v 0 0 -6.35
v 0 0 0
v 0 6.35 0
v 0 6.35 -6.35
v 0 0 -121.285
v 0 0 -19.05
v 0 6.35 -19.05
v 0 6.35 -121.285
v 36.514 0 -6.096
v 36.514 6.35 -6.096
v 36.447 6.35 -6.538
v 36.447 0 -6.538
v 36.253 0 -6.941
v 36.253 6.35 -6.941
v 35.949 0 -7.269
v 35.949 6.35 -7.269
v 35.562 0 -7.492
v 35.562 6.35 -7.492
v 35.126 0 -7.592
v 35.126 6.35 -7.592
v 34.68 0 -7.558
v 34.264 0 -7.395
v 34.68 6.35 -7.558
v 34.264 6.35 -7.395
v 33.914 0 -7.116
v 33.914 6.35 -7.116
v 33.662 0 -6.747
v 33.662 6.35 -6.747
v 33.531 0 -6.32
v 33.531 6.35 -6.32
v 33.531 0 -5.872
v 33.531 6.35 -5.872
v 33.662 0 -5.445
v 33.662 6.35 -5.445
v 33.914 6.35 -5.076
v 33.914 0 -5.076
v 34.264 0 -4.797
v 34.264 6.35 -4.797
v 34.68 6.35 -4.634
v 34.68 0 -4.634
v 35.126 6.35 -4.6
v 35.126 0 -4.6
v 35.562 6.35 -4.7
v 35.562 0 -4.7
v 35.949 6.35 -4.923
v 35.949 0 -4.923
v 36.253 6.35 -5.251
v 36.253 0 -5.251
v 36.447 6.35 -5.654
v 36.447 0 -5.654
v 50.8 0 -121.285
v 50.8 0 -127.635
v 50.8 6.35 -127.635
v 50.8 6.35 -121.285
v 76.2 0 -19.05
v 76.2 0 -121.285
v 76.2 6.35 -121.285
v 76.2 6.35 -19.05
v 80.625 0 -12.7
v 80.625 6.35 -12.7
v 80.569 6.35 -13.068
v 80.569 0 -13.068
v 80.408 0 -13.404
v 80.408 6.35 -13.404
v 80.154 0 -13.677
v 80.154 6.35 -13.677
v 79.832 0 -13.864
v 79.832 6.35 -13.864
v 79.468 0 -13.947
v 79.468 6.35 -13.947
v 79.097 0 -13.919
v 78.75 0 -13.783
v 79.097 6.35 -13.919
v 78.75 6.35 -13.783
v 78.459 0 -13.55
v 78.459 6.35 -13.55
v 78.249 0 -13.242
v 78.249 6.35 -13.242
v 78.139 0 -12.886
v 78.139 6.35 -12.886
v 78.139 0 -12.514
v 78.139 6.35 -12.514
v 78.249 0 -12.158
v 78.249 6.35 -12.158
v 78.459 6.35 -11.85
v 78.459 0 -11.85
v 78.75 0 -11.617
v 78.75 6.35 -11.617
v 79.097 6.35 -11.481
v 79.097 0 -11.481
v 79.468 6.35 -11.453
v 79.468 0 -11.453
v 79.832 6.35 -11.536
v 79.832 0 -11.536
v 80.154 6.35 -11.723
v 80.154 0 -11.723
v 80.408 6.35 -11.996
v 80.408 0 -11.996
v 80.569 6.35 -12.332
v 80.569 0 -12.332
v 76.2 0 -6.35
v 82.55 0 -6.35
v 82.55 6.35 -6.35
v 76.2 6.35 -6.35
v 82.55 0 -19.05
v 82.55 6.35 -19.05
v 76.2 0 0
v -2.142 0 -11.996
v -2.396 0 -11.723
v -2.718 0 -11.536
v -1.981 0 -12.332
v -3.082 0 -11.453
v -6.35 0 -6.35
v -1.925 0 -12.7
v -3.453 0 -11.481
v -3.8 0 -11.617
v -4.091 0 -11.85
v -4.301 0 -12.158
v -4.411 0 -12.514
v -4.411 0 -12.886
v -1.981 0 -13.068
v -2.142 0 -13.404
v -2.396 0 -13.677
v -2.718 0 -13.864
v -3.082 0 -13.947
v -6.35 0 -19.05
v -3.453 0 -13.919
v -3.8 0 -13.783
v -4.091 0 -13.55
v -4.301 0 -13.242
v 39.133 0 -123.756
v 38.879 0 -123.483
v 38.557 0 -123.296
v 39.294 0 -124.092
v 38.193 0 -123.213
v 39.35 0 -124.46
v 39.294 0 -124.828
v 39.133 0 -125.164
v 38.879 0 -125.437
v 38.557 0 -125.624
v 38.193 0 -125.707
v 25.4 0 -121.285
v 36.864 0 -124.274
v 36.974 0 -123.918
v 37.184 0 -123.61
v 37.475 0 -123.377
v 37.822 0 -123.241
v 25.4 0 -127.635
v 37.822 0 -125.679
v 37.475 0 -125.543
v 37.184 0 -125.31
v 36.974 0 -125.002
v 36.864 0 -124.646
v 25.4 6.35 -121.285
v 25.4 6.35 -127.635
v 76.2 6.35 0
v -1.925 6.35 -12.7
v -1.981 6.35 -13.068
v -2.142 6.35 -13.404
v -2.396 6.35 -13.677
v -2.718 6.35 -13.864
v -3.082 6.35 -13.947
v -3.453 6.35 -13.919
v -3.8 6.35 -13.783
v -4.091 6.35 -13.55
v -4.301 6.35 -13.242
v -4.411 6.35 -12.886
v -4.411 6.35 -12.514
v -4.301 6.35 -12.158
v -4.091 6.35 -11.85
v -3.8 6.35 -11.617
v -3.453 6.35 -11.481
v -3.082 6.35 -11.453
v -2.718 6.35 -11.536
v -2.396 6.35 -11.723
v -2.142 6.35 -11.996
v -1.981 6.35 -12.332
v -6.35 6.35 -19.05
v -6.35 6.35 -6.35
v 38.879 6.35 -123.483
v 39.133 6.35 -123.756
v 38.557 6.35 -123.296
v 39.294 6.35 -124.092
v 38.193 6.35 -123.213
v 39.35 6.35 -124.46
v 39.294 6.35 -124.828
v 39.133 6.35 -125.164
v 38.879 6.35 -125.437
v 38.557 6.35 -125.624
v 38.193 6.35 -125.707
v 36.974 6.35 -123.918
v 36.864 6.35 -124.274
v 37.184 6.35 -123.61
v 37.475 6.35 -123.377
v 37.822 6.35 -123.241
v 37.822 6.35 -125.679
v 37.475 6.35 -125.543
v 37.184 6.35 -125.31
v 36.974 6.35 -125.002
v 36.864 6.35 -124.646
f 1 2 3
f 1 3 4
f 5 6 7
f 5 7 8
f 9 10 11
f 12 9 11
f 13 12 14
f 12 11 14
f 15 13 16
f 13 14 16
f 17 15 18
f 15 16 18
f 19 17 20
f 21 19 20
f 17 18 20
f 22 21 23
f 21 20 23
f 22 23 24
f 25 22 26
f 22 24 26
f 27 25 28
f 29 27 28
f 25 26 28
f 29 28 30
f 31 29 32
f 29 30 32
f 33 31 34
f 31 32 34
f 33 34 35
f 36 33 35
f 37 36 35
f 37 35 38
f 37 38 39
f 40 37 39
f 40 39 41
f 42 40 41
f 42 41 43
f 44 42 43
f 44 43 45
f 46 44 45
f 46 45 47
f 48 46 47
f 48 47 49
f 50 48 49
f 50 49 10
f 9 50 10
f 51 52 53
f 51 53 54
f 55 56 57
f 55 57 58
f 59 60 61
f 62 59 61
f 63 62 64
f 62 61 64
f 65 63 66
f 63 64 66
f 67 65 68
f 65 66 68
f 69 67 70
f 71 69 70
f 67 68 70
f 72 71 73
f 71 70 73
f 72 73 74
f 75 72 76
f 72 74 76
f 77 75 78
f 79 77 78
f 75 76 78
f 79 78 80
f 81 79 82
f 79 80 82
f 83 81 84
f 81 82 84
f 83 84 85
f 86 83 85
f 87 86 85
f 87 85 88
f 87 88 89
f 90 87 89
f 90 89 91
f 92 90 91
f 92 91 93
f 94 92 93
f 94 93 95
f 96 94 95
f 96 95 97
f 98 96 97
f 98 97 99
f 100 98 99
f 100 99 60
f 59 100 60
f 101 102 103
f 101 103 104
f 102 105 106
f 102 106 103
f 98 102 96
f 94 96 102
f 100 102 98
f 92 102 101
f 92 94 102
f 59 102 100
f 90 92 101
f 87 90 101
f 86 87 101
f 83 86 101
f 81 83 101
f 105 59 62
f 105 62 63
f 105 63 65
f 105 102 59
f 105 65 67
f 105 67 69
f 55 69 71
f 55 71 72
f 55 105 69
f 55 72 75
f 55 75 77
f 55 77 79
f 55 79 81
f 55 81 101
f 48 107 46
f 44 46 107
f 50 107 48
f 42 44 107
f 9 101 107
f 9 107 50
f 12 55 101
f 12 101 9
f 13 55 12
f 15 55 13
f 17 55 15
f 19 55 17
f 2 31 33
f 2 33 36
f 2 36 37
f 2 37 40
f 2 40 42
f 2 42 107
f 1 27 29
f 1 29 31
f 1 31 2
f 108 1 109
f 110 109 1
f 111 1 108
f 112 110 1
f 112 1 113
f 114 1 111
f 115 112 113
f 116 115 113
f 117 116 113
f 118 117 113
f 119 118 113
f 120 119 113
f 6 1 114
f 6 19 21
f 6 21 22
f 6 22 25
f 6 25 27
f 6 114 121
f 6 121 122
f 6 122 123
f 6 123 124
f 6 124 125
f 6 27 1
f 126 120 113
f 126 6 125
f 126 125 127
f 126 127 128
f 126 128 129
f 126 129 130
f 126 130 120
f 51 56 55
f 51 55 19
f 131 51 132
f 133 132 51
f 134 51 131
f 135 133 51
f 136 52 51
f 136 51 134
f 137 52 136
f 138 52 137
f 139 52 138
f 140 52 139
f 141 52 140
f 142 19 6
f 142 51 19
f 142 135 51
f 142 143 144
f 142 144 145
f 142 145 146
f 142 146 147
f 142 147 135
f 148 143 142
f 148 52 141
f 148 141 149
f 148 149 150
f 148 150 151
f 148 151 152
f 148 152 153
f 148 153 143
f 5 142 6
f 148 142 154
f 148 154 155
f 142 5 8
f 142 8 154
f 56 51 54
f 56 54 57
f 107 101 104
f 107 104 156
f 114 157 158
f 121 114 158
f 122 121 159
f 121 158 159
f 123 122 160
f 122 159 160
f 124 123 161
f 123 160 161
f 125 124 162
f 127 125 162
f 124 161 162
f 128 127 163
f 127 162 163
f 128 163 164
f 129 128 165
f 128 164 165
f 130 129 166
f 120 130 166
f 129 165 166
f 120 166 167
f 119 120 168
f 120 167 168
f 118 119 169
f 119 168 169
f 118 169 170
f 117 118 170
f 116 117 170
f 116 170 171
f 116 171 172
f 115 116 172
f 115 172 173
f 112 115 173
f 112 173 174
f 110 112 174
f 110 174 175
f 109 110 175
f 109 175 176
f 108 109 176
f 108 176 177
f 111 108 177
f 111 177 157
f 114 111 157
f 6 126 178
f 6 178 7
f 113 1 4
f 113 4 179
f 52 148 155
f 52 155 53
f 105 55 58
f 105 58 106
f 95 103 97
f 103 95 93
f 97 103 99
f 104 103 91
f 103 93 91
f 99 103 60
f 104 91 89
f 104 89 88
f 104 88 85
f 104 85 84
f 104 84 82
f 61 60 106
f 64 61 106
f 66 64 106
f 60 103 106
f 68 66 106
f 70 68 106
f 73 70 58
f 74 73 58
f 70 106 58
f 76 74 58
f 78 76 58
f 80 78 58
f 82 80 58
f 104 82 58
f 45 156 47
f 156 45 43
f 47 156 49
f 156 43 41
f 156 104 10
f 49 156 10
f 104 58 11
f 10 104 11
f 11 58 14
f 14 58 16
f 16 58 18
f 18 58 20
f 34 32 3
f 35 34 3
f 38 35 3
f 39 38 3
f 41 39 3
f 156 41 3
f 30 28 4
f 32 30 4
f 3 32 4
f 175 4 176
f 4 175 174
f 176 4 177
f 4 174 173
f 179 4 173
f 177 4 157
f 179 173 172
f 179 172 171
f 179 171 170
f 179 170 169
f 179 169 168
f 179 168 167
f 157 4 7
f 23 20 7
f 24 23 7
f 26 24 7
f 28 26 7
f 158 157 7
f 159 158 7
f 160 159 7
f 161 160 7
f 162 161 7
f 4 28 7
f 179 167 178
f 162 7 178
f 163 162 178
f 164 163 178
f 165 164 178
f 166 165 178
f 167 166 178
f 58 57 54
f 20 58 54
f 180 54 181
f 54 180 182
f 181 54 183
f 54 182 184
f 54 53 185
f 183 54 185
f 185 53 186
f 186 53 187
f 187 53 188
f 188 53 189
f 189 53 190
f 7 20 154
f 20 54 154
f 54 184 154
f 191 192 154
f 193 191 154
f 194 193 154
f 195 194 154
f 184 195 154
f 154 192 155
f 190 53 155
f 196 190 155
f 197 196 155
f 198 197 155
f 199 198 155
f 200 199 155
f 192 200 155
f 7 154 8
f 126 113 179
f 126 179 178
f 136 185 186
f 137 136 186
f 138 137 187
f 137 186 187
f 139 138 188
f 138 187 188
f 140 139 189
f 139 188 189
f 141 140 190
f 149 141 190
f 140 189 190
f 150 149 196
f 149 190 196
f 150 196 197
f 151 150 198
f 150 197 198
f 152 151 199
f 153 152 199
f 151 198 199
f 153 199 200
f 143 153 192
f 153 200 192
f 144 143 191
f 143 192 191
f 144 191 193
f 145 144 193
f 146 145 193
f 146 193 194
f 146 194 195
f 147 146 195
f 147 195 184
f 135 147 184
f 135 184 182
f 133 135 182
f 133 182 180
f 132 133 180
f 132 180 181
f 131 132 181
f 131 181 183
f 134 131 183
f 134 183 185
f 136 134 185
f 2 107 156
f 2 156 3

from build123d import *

# Parameters (mm, degrees)
BOSS_EXTRUDE1_DEPTH = 6.35
SKETCH2_R           = 1.5
CUT_EXTRUDE1_DEPTH  = 7.35
SKETCH3_R           = 1.25
CUT_EXTRUDE2_DEPTH  = 7.35


with BuildPart() as part:
    # Sketch1 → Boss-Extrude1 (new body)
    with BuildSketch(Plane(origin=(0, 0, 0), x_dir=(1, 0, 0), z_dir=(0, 1, 0))):
        Polygon((50.8, 121.285), (76.2, 121.285), (76.2, 19.05), (82.55, 19.05), (82.55, 6.35), (76.2, 6.35), (76.2, 0), (0, 0), (0, 6.35), (-6.35, 6.35), (-6.35, 19.05), (0, 19.05), (0, 121.285), (25.4, 121.285), (25.4, 127.635), (50.8, 127.635), align=None)
    extrude(amount=BOSS_EXTRUDE1_DEPTH)

    # Sketch2 → Cut-Extrude1 (cut, through all)
    with BuildSketch(Plane(origin=(0, 6.35, 0), x_dir=(1, 0, 0), z_dir=(0, 1, 0))):
        with Locations((35.0139, 6.096)):
            Circle(SKETCH2_R)
    extrude(amount=-CUT_EXTRUDE1_DEPTH, mode=Mode.SUBTRACT)

    # Sketch3 → Cut-Extrude2 (cut, through all)
    with BuildSketch(Plane(origin=(0, 6.35, 0), x_dir=(1, 0, 0), z_dir=(0, 1, 0))):
        with Locations((-3.175, 12.7)):
            Circle(SKETCH3_R)
        with Locations((79.375, 12.7)):
            Circle(SKETCH3_R)
        with Locations((38.1, 124.46)):
            Circle(SKETCH3_R)
    extrude(amount=-CUT_EXTRUDE2_DEPTH, mode=Mode.SUBTRACT)


solid = part.part
